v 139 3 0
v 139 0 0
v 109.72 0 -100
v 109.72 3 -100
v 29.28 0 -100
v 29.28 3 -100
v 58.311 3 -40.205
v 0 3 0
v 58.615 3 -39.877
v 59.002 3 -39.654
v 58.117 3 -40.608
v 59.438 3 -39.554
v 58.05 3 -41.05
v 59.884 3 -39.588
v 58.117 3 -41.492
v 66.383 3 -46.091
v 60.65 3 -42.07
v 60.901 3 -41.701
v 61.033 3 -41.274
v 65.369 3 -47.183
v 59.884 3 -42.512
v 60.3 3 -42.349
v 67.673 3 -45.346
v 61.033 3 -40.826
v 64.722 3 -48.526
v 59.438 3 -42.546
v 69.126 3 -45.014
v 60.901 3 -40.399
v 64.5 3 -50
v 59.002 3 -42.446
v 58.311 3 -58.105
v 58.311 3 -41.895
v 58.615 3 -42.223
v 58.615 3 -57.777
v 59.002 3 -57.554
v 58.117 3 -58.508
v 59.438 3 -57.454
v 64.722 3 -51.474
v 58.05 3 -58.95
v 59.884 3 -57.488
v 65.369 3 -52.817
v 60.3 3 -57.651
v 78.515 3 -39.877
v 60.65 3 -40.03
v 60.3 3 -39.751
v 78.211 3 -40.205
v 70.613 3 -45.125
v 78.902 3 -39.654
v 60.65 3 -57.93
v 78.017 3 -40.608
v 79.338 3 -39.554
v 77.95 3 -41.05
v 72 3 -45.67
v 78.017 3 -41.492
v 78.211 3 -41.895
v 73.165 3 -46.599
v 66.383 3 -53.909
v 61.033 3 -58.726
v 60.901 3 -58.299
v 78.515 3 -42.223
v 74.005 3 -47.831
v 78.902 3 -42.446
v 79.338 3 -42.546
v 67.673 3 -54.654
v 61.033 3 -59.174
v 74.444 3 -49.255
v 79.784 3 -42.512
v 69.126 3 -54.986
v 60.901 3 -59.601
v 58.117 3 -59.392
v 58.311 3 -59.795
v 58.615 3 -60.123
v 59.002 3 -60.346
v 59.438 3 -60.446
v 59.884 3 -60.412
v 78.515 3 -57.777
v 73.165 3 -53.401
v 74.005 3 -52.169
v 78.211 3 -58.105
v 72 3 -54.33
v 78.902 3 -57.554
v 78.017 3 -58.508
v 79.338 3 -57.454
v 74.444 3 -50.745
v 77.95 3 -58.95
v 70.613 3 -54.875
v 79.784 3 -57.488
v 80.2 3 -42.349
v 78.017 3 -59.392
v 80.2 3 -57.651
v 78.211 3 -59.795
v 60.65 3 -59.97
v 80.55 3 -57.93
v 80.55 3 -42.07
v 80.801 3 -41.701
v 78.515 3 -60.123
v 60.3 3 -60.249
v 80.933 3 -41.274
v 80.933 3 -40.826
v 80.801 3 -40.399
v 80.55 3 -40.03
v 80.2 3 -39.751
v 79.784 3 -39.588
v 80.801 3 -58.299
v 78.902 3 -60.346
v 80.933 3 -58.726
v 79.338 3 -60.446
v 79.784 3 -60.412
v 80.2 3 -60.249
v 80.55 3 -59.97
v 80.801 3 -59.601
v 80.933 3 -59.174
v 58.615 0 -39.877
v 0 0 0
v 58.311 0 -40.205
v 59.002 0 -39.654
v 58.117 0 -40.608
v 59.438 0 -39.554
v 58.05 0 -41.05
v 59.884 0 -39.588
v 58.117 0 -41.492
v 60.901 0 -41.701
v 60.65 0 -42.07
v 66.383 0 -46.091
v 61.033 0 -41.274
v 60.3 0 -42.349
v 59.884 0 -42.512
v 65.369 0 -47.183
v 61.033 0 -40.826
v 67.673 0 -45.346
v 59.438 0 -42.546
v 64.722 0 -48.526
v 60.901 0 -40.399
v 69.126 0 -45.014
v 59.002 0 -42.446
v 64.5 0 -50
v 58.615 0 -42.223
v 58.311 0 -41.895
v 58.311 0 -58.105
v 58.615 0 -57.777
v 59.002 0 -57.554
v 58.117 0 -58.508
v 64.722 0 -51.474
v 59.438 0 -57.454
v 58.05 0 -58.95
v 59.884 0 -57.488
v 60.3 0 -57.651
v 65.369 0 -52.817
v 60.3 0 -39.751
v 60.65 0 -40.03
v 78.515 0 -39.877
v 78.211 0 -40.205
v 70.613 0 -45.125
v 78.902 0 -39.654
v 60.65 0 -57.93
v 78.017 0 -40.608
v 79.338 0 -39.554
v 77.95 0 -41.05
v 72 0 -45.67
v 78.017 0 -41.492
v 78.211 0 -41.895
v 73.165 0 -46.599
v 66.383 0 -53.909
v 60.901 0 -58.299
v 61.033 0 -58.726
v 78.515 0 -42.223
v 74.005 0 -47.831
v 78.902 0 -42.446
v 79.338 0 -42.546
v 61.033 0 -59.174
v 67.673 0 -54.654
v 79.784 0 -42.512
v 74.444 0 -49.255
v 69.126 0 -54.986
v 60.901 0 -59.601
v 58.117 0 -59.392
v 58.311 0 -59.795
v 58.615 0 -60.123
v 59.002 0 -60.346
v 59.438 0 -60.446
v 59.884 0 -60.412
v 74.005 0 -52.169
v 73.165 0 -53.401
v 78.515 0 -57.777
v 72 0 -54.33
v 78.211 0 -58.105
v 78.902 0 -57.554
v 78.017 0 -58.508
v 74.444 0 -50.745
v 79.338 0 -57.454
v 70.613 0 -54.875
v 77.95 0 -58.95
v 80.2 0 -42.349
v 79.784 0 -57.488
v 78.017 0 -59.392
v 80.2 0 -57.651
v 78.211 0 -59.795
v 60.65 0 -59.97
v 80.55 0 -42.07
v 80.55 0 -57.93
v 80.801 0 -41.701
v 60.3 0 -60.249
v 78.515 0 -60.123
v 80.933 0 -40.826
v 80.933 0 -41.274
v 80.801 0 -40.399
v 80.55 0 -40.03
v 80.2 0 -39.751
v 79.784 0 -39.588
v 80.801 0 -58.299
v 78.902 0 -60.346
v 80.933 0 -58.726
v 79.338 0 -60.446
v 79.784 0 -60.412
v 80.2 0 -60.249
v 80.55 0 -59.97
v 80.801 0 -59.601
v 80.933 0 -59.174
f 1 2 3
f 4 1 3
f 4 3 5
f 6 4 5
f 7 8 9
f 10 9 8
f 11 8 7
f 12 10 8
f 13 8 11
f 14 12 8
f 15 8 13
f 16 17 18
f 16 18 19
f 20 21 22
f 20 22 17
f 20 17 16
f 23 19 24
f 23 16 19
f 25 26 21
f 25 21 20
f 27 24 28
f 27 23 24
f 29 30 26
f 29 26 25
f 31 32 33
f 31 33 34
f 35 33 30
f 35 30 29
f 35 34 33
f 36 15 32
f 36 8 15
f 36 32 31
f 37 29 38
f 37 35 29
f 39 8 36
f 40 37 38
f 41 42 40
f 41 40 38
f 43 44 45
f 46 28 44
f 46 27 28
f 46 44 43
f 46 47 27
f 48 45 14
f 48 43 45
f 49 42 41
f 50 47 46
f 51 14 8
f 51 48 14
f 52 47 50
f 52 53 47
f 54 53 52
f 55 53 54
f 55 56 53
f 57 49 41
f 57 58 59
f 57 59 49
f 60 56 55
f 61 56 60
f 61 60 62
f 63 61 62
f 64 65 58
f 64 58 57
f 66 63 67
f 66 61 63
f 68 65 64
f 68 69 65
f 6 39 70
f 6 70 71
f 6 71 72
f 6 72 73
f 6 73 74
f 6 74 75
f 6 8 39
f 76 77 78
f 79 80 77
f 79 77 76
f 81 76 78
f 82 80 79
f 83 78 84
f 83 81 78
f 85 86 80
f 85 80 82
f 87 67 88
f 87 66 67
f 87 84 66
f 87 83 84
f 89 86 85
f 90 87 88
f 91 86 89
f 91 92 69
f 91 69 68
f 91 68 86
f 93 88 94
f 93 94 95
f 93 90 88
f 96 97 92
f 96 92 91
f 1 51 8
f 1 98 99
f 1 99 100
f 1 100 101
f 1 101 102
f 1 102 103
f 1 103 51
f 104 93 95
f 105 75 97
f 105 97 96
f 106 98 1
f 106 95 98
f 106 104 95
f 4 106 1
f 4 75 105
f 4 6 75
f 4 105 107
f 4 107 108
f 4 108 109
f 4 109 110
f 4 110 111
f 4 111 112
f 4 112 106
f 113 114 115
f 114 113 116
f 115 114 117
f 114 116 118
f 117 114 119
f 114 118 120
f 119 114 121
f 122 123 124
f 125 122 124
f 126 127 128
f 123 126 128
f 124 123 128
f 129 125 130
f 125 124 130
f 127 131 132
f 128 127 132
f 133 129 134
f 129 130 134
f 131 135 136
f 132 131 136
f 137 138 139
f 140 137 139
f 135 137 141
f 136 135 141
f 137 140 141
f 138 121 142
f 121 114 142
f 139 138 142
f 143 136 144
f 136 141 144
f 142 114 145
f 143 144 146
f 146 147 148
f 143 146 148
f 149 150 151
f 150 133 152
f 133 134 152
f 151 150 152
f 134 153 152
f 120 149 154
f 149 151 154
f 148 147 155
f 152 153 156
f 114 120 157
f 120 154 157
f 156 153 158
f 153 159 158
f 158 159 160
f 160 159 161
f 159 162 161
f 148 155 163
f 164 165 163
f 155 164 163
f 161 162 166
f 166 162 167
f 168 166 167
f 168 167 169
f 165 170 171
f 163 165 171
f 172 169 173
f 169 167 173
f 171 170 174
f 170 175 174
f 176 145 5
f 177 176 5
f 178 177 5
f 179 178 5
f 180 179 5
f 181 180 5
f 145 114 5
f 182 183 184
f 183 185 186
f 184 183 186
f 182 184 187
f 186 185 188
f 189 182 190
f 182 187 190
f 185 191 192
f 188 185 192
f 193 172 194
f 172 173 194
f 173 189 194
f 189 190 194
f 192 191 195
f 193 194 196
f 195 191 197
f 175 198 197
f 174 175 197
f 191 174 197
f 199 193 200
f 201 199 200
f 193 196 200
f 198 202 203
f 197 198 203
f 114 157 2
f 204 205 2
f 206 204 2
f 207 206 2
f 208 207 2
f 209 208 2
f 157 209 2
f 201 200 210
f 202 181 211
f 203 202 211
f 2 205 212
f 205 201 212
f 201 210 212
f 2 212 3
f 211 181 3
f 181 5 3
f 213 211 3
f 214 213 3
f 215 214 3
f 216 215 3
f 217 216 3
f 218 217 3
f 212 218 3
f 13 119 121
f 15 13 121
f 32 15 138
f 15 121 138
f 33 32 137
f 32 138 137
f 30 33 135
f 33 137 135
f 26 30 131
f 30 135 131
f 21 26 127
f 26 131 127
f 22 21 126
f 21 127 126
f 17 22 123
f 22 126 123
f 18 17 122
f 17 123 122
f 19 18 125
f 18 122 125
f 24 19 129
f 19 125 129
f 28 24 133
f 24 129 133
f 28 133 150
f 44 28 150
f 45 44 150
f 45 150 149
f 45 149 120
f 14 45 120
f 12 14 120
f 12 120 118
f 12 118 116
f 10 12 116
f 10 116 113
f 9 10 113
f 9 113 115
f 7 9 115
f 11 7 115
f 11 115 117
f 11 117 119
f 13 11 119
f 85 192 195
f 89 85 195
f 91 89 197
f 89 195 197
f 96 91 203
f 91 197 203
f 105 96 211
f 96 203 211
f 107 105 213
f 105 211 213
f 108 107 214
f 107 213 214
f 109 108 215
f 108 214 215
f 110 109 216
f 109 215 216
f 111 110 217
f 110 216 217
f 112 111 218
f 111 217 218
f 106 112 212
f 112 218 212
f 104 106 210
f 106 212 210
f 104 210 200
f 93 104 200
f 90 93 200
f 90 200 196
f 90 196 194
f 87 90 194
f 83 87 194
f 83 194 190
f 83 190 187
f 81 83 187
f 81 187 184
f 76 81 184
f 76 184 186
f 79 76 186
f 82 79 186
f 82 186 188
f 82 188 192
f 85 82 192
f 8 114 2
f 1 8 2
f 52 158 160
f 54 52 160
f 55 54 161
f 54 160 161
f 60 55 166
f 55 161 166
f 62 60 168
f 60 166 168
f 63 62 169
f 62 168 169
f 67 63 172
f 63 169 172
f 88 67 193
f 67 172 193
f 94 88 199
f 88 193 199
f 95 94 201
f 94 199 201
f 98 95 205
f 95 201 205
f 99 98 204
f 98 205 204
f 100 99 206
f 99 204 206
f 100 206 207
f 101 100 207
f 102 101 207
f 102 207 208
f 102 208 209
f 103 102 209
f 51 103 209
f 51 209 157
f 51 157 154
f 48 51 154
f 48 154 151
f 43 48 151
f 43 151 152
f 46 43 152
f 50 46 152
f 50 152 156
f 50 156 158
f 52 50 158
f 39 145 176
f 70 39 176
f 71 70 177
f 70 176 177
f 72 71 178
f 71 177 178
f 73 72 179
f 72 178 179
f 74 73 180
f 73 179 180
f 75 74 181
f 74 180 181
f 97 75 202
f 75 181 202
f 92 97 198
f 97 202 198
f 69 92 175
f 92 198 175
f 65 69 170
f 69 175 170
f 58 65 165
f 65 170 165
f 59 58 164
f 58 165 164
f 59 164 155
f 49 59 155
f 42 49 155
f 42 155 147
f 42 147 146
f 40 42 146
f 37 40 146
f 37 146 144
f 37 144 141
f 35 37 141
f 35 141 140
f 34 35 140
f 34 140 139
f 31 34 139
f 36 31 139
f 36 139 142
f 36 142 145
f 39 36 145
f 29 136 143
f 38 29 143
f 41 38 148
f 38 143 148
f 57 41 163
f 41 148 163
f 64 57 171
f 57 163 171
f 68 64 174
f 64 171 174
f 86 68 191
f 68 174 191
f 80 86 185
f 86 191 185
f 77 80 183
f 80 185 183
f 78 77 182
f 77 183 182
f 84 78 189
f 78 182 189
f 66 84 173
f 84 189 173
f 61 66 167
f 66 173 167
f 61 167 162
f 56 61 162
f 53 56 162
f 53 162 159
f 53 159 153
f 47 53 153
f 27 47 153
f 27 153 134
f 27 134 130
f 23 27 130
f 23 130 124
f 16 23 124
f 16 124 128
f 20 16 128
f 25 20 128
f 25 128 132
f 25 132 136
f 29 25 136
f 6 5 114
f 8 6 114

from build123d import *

# Parameters (mm, degrees)
BOSS_EXTRUDE1_DEPTH        = 3
F_10_0MM_DOWEL_HOLE1_D     = 10
F_10_0MM_DOWEL_HOLE1_DEPTH = 3
F_3_0MM_DOWEL_HOLE1_D      = 3
F_3_0MM_DOWEL_HOLE1_DEPTH  = 3


with BuildPart() as part:
    # Sketch1 → Boss-Extrude1 (new body)
    with BuildSketch(Plane(origin=(0, 0, 0), x_dir=(1, 0, 0), z_dir=(0, 1, 0))):
        Polygon((0, 0), (139, 0), (109.720058283, 100), (29.279941717, 100), align=None)
    extrude(amount=BOSS_EXTRUDE1_DEPTH)

    # Ø10.0mm Dowel Hole1
    with Locations(Plane(origin=(0, 3, 0), x_dir=(1, 0, 0), z_dir=(0, 1, 0))):
        with Locations((69.5, 50)):
            Hole(F_10_0MM_DOWEL_HOLE1_D / 2, depth=F_10_0MM_DOWEL_HOLE1_DEPTH)

    # Ø3.0mm Dowel Hole1
    with Locations(Plane(origin=(0, 3, 0), x_dir=(1, 0, 0), z_dir=(0, 1, 0))):
        with Locations((59.55, 41.05), (59.55, 58.95), (79.45, 58.95), (79.45, 41.05)):
            Hole(F_3_0MM_DOWEL_HOLE1_D / 2, depth=F_3_0MM_DOWEL_HOLE1_DEPTH)


solid = part.part
